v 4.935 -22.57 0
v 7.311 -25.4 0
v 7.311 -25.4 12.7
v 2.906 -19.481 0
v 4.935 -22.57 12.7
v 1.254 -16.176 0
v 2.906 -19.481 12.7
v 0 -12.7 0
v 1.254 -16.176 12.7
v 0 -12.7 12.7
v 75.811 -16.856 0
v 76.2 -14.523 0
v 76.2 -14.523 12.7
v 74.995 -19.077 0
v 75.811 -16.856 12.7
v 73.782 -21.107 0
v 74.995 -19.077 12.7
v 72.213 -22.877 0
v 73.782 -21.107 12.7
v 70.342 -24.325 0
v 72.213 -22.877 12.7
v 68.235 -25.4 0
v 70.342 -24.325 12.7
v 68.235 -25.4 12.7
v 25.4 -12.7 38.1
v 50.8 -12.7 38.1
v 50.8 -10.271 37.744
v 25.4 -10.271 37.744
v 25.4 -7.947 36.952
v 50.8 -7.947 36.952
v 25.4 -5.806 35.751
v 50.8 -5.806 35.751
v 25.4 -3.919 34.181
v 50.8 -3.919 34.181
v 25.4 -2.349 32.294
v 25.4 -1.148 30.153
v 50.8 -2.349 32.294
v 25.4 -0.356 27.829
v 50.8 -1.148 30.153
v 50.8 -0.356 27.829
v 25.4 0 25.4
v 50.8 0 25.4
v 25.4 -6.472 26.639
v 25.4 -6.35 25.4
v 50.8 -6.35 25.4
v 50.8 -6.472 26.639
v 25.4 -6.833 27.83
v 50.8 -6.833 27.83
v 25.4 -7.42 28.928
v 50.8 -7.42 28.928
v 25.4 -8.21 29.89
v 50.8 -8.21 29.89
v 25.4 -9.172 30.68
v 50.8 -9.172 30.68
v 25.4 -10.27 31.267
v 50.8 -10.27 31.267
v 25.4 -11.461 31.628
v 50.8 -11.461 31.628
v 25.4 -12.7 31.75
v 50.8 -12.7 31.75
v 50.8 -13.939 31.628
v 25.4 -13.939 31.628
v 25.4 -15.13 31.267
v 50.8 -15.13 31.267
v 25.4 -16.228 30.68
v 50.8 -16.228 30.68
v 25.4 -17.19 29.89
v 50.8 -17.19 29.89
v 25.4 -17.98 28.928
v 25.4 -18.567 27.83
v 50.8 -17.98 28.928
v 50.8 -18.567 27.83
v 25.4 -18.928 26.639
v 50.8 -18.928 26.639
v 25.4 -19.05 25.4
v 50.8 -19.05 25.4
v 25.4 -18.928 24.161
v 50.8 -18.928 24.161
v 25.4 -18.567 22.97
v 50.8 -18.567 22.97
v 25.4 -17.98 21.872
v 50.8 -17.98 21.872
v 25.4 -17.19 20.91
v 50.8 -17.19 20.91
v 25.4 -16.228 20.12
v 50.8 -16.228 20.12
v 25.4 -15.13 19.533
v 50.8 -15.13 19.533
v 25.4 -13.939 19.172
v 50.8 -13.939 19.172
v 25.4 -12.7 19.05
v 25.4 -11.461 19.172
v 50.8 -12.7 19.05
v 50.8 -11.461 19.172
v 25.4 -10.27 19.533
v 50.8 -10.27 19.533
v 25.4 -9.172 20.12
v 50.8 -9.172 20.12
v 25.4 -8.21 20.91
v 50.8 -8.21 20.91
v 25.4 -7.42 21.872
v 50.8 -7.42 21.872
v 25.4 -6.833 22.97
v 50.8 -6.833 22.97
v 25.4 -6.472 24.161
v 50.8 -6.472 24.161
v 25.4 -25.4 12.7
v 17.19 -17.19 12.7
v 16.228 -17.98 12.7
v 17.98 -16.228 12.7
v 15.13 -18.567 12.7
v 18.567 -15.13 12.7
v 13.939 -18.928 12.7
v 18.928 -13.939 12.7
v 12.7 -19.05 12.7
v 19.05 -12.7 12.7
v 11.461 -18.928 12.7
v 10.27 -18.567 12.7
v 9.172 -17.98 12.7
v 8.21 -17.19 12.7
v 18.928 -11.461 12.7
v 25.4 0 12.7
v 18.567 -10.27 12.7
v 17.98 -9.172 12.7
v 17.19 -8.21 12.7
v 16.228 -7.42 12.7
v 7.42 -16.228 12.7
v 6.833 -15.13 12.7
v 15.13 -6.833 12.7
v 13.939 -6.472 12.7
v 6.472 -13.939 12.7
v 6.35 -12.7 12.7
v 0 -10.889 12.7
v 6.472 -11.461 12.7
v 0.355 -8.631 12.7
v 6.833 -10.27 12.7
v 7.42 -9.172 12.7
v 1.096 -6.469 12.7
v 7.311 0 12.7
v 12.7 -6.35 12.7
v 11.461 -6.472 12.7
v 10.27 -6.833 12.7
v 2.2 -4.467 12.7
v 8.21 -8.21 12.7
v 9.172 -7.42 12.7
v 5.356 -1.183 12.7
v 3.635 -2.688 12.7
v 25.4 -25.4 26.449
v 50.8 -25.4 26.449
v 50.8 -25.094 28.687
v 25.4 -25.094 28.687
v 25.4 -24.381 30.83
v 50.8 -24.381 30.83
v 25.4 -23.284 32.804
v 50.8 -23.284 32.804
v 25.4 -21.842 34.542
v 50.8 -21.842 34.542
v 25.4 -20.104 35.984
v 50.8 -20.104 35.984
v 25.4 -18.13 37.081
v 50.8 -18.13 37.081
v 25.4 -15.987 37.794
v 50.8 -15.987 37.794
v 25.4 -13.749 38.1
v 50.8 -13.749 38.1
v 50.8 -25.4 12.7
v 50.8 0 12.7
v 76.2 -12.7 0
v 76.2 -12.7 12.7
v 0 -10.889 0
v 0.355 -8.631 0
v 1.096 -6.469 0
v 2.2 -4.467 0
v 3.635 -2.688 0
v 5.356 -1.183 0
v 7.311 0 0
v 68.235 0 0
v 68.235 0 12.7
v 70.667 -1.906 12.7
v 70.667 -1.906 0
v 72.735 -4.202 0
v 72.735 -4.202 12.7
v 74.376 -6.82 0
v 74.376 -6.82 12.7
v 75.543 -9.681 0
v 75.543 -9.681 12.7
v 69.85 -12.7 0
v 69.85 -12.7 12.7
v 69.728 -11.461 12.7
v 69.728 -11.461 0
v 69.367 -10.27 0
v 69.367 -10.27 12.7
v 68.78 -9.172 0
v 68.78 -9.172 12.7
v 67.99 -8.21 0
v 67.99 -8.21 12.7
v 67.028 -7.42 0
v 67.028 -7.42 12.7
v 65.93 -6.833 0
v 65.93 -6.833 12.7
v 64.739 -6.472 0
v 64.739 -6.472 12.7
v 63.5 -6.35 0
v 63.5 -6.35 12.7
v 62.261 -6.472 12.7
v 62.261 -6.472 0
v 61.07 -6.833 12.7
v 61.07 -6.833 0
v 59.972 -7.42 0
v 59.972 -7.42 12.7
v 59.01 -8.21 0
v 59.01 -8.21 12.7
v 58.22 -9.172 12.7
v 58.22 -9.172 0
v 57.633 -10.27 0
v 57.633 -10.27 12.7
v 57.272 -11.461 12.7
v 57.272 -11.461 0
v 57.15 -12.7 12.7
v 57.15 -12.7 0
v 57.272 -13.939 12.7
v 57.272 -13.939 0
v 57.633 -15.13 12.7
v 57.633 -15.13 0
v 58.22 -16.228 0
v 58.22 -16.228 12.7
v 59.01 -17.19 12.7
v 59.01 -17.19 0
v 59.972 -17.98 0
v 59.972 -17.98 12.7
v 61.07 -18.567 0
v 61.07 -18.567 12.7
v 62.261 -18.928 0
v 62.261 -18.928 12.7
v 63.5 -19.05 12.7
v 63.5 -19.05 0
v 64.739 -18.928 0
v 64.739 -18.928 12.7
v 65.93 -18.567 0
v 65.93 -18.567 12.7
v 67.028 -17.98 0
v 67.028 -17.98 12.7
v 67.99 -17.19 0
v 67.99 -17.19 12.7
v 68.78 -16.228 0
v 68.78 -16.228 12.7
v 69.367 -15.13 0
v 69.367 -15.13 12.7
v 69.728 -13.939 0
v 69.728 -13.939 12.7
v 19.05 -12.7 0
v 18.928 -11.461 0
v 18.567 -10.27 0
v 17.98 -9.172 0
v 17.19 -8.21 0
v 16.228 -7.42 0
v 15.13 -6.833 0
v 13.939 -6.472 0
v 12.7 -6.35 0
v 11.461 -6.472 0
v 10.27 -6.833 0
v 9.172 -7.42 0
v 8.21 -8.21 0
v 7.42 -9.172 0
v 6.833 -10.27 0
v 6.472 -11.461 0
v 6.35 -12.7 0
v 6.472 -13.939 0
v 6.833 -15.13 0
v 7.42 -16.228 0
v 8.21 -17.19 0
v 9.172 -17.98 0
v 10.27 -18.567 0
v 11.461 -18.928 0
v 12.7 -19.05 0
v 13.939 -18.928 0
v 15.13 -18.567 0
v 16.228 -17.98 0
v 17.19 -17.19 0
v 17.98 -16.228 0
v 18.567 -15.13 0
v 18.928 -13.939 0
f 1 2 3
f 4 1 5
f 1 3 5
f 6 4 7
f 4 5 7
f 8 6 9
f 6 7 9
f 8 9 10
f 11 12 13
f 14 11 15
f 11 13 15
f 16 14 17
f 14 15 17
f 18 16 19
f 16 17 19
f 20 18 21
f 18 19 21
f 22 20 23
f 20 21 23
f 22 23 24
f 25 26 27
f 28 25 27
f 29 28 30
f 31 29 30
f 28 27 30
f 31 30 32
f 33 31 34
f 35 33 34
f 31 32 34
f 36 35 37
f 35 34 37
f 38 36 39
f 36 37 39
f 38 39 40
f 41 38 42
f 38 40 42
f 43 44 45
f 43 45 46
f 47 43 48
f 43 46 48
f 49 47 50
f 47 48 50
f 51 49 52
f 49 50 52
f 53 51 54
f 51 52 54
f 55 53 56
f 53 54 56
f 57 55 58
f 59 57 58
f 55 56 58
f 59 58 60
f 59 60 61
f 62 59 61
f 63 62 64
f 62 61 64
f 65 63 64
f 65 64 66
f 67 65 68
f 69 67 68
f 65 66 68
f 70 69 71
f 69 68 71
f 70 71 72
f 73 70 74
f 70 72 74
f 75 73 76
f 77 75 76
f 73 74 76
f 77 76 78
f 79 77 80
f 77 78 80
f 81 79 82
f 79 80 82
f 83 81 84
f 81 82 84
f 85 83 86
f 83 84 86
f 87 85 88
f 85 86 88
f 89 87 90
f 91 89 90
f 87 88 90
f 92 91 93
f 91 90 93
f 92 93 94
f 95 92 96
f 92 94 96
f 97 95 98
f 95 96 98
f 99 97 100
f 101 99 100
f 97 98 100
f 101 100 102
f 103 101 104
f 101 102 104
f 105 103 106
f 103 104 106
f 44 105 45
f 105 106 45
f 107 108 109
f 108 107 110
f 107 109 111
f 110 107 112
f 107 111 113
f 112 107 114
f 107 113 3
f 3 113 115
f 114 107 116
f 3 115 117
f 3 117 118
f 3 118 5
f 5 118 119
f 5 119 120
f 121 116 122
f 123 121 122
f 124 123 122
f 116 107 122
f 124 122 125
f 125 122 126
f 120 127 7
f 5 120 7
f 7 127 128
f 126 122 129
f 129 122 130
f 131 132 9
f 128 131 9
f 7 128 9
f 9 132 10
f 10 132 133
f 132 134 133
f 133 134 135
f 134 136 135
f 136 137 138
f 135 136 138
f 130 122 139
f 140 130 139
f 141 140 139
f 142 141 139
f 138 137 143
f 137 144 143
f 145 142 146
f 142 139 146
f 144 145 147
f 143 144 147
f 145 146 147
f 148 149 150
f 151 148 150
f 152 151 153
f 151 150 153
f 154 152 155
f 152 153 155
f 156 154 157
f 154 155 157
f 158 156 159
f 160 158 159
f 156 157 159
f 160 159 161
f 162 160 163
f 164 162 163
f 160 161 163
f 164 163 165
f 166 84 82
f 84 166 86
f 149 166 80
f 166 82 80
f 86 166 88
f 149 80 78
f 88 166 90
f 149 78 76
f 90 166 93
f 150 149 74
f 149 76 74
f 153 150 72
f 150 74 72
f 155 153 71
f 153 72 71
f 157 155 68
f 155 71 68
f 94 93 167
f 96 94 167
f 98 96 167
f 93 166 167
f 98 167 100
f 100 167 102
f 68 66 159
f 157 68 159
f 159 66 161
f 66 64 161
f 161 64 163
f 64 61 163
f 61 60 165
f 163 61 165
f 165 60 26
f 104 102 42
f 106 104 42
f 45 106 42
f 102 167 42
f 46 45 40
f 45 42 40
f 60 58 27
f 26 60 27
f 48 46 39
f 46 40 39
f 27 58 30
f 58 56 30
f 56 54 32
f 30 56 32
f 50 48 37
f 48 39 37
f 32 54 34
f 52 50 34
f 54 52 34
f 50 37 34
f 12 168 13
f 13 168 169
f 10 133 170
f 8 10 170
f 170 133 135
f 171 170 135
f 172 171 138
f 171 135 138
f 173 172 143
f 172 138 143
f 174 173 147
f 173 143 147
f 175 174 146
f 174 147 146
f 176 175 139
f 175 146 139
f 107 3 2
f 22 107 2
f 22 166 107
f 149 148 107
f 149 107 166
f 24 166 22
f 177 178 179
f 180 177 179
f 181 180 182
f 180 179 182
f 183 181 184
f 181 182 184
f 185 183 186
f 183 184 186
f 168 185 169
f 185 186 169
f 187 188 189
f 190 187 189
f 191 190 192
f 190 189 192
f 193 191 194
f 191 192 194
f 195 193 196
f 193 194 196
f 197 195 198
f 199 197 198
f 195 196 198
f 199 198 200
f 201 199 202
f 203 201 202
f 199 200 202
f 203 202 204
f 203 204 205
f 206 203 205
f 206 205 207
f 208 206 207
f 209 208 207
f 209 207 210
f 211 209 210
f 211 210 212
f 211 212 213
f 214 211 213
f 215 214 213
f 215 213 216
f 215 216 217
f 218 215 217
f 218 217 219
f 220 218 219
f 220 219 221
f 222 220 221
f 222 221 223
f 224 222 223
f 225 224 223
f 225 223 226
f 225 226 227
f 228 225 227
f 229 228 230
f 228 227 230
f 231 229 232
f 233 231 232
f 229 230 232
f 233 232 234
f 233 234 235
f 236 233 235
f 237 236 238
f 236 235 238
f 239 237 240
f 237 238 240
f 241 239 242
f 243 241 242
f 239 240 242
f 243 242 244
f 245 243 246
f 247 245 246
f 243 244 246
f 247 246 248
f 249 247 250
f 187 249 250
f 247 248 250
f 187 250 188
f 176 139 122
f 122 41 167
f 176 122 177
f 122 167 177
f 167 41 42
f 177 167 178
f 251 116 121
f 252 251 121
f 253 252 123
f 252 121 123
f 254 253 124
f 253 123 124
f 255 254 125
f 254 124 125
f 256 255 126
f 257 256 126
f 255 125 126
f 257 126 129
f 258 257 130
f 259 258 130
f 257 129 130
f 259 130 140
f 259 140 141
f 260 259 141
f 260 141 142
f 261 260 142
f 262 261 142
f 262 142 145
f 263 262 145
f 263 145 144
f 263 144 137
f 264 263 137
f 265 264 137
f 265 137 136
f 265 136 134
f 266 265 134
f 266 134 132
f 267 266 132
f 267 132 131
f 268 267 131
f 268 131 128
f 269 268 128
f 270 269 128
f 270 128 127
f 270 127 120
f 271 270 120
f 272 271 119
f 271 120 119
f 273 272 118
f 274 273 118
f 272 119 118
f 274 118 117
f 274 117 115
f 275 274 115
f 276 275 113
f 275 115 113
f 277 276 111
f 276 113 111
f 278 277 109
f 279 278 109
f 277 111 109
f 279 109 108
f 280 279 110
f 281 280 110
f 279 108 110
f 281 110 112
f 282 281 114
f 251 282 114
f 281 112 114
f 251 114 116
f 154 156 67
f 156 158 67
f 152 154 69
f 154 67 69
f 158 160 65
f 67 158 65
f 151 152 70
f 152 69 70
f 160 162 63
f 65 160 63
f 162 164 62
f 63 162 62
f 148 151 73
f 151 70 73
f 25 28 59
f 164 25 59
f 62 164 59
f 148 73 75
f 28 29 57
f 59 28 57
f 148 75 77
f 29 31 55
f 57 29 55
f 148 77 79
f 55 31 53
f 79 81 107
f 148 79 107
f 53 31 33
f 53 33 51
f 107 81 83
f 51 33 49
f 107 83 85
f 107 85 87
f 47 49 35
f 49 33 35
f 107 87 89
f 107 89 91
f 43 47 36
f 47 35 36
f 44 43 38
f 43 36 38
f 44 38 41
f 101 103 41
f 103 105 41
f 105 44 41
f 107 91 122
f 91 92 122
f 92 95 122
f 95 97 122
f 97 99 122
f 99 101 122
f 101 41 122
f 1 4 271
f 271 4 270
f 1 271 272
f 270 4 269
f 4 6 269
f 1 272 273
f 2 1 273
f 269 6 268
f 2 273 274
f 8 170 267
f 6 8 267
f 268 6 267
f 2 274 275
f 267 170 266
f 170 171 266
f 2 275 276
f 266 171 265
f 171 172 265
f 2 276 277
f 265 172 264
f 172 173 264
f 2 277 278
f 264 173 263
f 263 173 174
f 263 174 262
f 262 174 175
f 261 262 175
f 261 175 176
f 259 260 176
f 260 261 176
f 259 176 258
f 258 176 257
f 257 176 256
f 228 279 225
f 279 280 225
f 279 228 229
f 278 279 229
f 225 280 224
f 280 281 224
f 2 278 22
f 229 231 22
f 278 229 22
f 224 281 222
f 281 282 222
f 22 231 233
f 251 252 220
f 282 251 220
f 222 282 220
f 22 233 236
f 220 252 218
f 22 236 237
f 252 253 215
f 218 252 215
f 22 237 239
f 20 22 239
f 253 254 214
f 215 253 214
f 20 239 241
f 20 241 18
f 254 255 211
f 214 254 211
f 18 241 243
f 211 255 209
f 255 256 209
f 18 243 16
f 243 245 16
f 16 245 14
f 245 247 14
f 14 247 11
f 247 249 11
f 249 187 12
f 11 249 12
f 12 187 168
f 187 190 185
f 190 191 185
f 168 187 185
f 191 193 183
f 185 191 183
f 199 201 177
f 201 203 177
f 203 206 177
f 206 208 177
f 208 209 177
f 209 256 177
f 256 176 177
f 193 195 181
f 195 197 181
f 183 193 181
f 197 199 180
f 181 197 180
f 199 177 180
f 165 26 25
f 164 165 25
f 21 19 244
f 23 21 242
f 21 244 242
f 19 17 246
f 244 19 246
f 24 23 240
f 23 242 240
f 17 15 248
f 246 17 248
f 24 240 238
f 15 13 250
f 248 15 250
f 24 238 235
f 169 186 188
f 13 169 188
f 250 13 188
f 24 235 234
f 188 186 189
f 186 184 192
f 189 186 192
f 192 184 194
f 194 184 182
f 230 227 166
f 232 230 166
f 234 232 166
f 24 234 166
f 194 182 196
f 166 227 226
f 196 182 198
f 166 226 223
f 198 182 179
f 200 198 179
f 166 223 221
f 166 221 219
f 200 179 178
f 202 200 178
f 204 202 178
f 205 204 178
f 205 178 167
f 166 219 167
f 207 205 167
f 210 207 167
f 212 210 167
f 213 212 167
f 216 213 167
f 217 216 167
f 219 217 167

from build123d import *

# Parameters (mm, degrees)
F1_DEPTH  = 25.4
F2_R      = 6.35
F3_DEPTH  = 25.4
F4_R      = 6.35
F5_DEPTH  = 25.4
F6_R      = 6.35
F7_DEPTH  = 25.4
F9_DEPTH  = 25.4
F11_DEPTH = 25.4
F13_DEPTH = 25.4


with BuildPart() as f1:
    # F0 (on Front) → F1 (new body)
    with BuildSketch(Plane.XZ):
        Polygon((0, 12.7), (0, 0), (76.2, 0), (76.2, 12.7), (50.8, 12.7), (50.8, 38.1), (25.4, 38.1), (25.4, 12.7), align=None)
    extrude(amount=F1_DEPTH)

    # F2 (on face) → F3 (cut)
    with BuildSketch(Plane.XY.offset(12.7)):
        with Locations((63.5, -12.7)):
            Circle(F2_R)
    extrude(amount=-F3_DEPTH, mode=Mode.SUBTRACT)

    # F4 (on face) → F5 (cut)
    with BuildSketch(Plane.XY.offset(12.7)):
        with Locations((12.7, -12.7)):
            Circle(F4_R)
    extrude(amount=-F5_DEPTH, mode=Mode.SUBTRACT)

    # F6 (on face) → F7 (cut)
    with BuildSketch(Plane.YZ.offset(50.8)):
        with Locations((-12.7, 25.4)):
            Circle(F6_R)
    extrude(amount=-F7_DEPTH, mode=Mode.SUBTRACT)

    # F8 (on face) → F9 (cut)
    with BuildSketch(Plane.XY.offset(12.7)):
        with BuildLine():
            ThreePointArc((68.2354718447, 0), (73.6121400289, -5.4755298609), (76.2, -12.7))
            Line((76.2, -12.7), (76.2, 0))
            Line((76.2, 0), (68.2354718447, 0))
        make_face()
        with BuildLine():
            ThreePointArc((76.2, -14.5233565668), (73.7819264131, -21.1070720145), (68.2354718447, -25.4))
            Line((68.2354718447, -25.4), (76.2, -25.4))
            Line((76.2, -25.4), (76.2, -14.5233565668))
        make_face()
    extrude(amount=-F9_DEPTH, mode=Mode.SUBTRACT)

    # F10 (on face) → F11 (cut)
    with BuildSketch(Plane.XY.offset(12.7)):
        with BuildLine():
            ThreePointArc((0, -10.8889817229), (2.2004439823, -4.4673896083), (7.3113371618, 0))
            Line((7.3113371618, 0), (0, 0))
            Line((0, 0), (0, -10.8889817229))
        make_face()
        with BuildLine():
            ThreePointArc((7.3113371618, -25.4), (2.9064077234, -19.4813463584), (0, -12.7))
            Line((0, -12.7), (0, -25.4))
            Line((0, -25.4), (7.3113371618, -25.4))
        make_face()
    extrude(amount=-F11_DEPTH, mode=Mode.SUBTRACT)

    # F12 (on face) → F13 (cut)
    with BuildSketch(Plane.YZ.offset(50.8)):
        with BuildLine():
            Line((0, 38.1), (-12.7, 38.1))
            ThreePointArc((-12.7, 38.1), (-3.9193677073, 34.1806322927), (0, 25.4))
            Line((0, 25.4), (0, 38.1))
        make_face()
        with BuildLine():
            ThreePointArc((-25.4, 26.4494707513), (-21.8419395594, 34.5419395594), (-13.7494707513, 38.1))
            Line((-13.7494707513, 38.1), (-25.4, 38.1))
            Line((-25.4, 38.1), (-25.4, 26.4494707513))
        make_face()
    extrude(amount=-F13_DEPTH, mode=Mode.SUBTRACT)


solid = f1.part
